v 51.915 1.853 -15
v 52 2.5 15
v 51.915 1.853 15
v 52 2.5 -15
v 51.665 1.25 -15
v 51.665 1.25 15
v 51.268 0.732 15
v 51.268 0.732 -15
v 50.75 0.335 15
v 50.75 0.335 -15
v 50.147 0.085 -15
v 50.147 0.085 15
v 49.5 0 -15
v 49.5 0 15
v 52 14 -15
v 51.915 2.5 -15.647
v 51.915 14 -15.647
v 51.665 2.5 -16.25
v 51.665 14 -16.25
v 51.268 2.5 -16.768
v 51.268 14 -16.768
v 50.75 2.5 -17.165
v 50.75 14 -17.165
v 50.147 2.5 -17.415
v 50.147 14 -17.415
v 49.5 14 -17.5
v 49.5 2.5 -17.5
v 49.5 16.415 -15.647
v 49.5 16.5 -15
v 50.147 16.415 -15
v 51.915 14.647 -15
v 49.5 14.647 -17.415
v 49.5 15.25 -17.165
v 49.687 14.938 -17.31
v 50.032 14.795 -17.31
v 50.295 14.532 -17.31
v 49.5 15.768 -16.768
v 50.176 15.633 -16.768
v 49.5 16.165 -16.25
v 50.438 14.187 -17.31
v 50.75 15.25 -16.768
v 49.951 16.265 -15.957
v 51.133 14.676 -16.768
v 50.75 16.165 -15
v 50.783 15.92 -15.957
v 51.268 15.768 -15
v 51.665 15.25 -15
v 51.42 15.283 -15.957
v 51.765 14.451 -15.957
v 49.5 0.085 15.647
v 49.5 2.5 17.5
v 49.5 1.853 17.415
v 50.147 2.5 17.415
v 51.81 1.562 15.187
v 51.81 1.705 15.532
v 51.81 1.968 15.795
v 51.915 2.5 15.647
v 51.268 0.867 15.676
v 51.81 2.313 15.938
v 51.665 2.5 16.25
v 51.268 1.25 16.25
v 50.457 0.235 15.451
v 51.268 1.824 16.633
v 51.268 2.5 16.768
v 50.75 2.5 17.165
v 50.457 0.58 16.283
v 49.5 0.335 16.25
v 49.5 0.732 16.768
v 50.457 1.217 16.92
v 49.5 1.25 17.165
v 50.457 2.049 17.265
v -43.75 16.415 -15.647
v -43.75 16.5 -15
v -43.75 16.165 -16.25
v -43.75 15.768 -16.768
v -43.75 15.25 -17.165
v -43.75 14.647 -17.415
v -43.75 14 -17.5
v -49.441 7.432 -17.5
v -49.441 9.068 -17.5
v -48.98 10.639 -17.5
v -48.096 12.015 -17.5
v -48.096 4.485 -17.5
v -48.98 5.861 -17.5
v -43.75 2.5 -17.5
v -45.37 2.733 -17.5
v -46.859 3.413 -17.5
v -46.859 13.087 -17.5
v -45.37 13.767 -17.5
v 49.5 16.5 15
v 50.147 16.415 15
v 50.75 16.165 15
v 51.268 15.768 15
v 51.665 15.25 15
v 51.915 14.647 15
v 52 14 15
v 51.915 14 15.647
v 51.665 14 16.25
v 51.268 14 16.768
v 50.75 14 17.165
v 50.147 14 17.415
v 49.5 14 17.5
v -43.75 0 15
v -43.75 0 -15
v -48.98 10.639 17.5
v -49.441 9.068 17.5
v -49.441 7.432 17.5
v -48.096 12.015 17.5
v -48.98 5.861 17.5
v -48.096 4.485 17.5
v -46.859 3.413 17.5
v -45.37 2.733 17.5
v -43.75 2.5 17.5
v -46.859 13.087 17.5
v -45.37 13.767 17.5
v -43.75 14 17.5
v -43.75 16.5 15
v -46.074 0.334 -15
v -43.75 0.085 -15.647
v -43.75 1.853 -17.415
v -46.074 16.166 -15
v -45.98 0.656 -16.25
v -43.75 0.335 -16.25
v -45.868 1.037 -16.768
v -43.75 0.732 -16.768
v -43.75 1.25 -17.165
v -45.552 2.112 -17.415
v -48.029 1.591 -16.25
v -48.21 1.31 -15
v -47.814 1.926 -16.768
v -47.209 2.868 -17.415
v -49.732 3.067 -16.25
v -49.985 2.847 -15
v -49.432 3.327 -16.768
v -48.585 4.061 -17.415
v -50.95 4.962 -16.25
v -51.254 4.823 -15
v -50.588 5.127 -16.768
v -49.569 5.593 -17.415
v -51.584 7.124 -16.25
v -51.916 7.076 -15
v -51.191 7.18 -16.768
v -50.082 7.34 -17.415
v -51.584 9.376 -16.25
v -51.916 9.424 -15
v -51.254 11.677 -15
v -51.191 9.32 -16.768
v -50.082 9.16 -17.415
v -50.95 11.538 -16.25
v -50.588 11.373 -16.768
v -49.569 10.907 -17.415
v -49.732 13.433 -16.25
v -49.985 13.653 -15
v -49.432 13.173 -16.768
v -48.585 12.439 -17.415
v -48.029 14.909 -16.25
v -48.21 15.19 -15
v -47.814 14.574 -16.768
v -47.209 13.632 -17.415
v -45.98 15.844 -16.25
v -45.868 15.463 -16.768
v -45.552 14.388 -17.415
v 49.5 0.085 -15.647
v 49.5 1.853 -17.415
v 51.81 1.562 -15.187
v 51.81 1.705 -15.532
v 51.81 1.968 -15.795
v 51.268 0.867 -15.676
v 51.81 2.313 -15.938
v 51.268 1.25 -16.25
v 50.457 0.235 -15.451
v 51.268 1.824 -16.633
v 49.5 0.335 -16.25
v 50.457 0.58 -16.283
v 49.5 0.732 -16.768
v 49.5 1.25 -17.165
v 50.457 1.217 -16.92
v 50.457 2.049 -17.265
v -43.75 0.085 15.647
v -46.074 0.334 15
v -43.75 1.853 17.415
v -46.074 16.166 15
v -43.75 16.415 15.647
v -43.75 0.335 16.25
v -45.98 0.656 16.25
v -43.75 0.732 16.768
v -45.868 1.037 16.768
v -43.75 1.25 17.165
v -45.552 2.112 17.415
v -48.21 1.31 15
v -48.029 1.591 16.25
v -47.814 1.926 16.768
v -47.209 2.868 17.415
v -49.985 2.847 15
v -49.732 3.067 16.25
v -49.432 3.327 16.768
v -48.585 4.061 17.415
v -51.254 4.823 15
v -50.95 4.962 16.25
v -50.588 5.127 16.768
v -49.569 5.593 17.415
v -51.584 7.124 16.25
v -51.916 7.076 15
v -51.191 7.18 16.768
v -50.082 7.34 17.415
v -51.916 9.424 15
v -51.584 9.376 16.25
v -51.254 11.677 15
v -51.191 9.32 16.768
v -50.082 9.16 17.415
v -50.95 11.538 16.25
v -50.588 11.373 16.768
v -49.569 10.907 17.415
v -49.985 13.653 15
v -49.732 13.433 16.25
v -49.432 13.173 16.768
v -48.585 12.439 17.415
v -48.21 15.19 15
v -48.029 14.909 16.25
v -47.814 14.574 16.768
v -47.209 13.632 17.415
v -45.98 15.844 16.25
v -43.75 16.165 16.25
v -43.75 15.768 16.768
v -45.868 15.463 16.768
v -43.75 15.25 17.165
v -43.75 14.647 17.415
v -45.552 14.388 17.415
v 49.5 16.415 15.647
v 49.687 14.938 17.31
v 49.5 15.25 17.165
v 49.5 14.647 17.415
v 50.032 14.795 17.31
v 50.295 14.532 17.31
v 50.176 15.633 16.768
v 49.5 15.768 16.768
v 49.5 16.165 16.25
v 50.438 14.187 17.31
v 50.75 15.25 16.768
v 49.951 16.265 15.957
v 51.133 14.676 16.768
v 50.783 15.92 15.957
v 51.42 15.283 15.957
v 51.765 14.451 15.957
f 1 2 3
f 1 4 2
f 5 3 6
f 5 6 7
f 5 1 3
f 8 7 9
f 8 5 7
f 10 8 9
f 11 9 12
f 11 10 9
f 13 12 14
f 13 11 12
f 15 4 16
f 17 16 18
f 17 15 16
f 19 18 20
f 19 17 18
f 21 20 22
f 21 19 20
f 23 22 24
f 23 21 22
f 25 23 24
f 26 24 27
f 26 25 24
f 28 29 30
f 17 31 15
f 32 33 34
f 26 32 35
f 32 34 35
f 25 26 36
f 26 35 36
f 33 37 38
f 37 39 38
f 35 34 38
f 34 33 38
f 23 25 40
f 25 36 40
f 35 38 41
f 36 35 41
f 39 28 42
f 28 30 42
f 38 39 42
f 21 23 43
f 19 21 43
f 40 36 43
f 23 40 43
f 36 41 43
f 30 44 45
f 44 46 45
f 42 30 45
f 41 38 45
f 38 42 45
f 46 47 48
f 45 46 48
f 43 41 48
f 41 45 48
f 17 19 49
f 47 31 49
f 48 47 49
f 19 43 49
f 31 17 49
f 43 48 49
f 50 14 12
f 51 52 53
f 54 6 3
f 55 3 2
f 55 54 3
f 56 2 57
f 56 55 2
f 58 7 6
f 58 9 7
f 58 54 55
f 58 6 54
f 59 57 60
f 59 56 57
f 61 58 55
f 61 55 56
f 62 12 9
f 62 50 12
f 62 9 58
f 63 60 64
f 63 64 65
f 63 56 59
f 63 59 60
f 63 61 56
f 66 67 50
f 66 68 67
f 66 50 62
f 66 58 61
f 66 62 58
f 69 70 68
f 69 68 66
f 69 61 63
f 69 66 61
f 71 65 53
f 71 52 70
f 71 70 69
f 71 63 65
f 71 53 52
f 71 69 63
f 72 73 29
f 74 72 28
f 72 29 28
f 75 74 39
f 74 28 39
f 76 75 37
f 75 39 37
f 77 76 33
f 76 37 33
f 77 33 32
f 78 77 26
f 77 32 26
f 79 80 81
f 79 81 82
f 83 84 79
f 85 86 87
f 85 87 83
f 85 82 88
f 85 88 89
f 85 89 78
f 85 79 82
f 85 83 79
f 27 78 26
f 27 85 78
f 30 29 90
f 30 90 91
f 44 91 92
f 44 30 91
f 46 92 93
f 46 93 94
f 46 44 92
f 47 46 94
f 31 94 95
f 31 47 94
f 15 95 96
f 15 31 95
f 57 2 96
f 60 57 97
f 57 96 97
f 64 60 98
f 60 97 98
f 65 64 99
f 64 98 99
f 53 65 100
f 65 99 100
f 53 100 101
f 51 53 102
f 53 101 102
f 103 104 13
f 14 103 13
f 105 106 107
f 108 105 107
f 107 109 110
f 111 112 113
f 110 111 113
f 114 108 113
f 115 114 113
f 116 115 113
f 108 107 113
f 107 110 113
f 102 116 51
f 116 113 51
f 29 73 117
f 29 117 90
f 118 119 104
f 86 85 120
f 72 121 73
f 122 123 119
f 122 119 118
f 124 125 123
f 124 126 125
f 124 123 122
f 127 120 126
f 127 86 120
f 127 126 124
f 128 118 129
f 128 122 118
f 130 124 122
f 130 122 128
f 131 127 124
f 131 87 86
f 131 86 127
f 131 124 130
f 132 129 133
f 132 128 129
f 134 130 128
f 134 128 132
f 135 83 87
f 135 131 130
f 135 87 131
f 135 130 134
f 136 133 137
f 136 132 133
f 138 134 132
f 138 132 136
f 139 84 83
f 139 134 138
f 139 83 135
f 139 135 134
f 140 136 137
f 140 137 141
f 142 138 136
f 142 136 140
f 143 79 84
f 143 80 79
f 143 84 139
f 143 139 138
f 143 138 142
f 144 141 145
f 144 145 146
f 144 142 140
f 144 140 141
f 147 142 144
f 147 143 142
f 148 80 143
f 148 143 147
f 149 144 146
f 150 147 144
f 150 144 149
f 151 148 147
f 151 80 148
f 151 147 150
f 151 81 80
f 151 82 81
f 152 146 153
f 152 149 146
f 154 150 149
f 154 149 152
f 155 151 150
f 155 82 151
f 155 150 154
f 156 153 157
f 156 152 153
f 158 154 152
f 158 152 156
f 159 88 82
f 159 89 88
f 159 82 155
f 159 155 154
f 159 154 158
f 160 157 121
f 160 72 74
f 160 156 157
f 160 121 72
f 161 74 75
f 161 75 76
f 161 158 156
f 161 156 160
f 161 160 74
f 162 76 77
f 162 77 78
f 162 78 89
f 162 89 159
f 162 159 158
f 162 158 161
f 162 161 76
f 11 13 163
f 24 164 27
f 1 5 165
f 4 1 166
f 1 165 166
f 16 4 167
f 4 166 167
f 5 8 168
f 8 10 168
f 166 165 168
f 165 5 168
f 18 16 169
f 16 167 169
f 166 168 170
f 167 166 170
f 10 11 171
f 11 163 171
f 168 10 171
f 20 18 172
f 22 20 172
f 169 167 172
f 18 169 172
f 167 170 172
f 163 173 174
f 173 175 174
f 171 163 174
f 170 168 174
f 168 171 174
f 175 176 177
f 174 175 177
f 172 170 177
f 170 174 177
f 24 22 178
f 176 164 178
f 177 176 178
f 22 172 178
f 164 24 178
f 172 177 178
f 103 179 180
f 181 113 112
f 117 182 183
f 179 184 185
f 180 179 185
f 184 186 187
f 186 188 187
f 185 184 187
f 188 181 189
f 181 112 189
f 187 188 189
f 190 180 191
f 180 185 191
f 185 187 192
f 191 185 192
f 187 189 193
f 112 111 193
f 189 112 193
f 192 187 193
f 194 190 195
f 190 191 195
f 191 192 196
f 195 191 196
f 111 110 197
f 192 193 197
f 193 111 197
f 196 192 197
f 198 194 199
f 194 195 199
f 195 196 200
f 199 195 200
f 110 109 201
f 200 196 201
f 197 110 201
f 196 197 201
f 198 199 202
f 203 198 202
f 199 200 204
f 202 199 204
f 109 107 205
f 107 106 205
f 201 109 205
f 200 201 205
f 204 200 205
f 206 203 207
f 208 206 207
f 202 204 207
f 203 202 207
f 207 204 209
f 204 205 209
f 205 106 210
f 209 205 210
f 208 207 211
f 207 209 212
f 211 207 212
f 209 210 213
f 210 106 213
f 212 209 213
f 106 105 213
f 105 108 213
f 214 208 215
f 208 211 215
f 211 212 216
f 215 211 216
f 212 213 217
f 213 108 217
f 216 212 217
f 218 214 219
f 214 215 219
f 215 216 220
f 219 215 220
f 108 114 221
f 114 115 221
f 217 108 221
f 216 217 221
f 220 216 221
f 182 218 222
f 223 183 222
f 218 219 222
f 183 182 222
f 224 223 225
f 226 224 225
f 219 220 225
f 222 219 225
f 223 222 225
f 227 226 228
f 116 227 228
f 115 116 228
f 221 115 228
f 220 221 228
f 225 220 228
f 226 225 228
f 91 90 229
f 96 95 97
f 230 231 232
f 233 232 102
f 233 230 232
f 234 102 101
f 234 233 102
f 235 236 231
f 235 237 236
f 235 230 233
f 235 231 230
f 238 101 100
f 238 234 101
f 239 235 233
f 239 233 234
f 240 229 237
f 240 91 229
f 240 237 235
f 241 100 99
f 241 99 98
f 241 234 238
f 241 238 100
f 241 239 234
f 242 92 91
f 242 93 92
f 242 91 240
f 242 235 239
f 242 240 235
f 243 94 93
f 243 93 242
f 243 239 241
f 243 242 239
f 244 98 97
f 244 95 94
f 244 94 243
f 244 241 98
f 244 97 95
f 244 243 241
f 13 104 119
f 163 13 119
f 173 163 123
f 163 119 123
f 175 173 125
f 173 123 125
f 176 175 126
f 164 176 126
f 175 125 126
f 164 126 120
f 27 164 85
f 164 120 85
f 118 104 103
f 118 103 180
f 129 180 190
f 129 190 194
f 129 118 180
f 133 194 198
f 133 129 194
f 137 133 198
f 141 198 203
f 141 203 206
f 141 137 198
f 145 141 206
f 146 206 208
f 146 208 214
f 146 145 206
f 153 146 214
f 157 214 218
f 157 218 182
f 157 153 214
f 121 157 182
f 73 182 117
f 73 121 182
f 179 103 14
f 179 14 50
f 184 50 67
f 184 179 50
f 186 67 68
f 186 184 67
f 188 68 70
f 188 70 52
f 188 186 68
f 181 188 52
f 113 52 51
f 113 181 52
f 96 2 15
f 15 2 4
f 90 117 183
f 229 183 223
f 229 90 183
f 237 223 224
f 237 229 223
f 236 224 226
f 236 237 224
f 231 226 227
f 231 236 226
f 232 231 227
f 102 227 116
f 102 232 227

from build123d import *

# Parameters (mm, degrees)
SKETCH1_W           = 104
SKETCH1_H           = 35
BOSS_EXTRUDE1_DEPTH = 16.5
FILLET2_RADIUS      = 8.25
FILLET2_LENGTH      = 35
FILLET3_R           = 2.5


with BuildPart() as part:
    # Sketch1 → Boss-Extrude1 (new body)
    with BuildSketch(Plane(origin=(0, 0, 0), x_dir=(1, 0, 0), z_dir=(0, 1, 0))):
        Rectangle(SKETCH1_W, SKETCH1_H)
    extrude(amount=BOSS_EXTRUDE1_DEPTH)

    # Fillet2: full round fillet: the end face becomes a half cylinder, R = half its width
    fillet2_face = Plane((-52, 8.25, 0), x_dir=(0, 0, -1), z_dir=(-1, 0, 0))  # on the end face: x along it, z out of the body
    fillet2_slab = fillet2_face.offset(-FILLET2_RADIUS / 2) * Box(FILLET2_LENGTH, 2 * FILLET2_RADIUS, FILLET2_RADIUS, mode=Mode.PRIVATE)  # the body's end, R deep
    fillet2_round = Plane((-43.75, 8.25, 0), x_dir=(-1, 0, 0), z_dir=(0, 0, -1)) * Cylinder(FILLET2_RADIUS, FILLET2_LENGTH, mode=Mode.PRIVATE)  # its axis R under the face
    add(fillet2_slab - fillet2_round, mode=Mode.SUBTRACT)

    # Fillet3
    fillet3_edges = [part.edges().sort_by_distance(p)[0] for p in [
        (52, 16.5, 0),
        (4.125, 16.5, 17.5),
        (4.125, 0, 17.5),
        (4.125, 16.5, -17.5),
        (-52, 8.25, -17.5),
        (-52, 8.25, 17.5),
        (4.125, 0, -17.5),
        (52, 0, 0),
        (52, 8.25, -17.5),
        (52, 8.25, 17.5),
    ]]
    fillet(fillet3_edges, radius=FILLET3_R)


solid = part.part
